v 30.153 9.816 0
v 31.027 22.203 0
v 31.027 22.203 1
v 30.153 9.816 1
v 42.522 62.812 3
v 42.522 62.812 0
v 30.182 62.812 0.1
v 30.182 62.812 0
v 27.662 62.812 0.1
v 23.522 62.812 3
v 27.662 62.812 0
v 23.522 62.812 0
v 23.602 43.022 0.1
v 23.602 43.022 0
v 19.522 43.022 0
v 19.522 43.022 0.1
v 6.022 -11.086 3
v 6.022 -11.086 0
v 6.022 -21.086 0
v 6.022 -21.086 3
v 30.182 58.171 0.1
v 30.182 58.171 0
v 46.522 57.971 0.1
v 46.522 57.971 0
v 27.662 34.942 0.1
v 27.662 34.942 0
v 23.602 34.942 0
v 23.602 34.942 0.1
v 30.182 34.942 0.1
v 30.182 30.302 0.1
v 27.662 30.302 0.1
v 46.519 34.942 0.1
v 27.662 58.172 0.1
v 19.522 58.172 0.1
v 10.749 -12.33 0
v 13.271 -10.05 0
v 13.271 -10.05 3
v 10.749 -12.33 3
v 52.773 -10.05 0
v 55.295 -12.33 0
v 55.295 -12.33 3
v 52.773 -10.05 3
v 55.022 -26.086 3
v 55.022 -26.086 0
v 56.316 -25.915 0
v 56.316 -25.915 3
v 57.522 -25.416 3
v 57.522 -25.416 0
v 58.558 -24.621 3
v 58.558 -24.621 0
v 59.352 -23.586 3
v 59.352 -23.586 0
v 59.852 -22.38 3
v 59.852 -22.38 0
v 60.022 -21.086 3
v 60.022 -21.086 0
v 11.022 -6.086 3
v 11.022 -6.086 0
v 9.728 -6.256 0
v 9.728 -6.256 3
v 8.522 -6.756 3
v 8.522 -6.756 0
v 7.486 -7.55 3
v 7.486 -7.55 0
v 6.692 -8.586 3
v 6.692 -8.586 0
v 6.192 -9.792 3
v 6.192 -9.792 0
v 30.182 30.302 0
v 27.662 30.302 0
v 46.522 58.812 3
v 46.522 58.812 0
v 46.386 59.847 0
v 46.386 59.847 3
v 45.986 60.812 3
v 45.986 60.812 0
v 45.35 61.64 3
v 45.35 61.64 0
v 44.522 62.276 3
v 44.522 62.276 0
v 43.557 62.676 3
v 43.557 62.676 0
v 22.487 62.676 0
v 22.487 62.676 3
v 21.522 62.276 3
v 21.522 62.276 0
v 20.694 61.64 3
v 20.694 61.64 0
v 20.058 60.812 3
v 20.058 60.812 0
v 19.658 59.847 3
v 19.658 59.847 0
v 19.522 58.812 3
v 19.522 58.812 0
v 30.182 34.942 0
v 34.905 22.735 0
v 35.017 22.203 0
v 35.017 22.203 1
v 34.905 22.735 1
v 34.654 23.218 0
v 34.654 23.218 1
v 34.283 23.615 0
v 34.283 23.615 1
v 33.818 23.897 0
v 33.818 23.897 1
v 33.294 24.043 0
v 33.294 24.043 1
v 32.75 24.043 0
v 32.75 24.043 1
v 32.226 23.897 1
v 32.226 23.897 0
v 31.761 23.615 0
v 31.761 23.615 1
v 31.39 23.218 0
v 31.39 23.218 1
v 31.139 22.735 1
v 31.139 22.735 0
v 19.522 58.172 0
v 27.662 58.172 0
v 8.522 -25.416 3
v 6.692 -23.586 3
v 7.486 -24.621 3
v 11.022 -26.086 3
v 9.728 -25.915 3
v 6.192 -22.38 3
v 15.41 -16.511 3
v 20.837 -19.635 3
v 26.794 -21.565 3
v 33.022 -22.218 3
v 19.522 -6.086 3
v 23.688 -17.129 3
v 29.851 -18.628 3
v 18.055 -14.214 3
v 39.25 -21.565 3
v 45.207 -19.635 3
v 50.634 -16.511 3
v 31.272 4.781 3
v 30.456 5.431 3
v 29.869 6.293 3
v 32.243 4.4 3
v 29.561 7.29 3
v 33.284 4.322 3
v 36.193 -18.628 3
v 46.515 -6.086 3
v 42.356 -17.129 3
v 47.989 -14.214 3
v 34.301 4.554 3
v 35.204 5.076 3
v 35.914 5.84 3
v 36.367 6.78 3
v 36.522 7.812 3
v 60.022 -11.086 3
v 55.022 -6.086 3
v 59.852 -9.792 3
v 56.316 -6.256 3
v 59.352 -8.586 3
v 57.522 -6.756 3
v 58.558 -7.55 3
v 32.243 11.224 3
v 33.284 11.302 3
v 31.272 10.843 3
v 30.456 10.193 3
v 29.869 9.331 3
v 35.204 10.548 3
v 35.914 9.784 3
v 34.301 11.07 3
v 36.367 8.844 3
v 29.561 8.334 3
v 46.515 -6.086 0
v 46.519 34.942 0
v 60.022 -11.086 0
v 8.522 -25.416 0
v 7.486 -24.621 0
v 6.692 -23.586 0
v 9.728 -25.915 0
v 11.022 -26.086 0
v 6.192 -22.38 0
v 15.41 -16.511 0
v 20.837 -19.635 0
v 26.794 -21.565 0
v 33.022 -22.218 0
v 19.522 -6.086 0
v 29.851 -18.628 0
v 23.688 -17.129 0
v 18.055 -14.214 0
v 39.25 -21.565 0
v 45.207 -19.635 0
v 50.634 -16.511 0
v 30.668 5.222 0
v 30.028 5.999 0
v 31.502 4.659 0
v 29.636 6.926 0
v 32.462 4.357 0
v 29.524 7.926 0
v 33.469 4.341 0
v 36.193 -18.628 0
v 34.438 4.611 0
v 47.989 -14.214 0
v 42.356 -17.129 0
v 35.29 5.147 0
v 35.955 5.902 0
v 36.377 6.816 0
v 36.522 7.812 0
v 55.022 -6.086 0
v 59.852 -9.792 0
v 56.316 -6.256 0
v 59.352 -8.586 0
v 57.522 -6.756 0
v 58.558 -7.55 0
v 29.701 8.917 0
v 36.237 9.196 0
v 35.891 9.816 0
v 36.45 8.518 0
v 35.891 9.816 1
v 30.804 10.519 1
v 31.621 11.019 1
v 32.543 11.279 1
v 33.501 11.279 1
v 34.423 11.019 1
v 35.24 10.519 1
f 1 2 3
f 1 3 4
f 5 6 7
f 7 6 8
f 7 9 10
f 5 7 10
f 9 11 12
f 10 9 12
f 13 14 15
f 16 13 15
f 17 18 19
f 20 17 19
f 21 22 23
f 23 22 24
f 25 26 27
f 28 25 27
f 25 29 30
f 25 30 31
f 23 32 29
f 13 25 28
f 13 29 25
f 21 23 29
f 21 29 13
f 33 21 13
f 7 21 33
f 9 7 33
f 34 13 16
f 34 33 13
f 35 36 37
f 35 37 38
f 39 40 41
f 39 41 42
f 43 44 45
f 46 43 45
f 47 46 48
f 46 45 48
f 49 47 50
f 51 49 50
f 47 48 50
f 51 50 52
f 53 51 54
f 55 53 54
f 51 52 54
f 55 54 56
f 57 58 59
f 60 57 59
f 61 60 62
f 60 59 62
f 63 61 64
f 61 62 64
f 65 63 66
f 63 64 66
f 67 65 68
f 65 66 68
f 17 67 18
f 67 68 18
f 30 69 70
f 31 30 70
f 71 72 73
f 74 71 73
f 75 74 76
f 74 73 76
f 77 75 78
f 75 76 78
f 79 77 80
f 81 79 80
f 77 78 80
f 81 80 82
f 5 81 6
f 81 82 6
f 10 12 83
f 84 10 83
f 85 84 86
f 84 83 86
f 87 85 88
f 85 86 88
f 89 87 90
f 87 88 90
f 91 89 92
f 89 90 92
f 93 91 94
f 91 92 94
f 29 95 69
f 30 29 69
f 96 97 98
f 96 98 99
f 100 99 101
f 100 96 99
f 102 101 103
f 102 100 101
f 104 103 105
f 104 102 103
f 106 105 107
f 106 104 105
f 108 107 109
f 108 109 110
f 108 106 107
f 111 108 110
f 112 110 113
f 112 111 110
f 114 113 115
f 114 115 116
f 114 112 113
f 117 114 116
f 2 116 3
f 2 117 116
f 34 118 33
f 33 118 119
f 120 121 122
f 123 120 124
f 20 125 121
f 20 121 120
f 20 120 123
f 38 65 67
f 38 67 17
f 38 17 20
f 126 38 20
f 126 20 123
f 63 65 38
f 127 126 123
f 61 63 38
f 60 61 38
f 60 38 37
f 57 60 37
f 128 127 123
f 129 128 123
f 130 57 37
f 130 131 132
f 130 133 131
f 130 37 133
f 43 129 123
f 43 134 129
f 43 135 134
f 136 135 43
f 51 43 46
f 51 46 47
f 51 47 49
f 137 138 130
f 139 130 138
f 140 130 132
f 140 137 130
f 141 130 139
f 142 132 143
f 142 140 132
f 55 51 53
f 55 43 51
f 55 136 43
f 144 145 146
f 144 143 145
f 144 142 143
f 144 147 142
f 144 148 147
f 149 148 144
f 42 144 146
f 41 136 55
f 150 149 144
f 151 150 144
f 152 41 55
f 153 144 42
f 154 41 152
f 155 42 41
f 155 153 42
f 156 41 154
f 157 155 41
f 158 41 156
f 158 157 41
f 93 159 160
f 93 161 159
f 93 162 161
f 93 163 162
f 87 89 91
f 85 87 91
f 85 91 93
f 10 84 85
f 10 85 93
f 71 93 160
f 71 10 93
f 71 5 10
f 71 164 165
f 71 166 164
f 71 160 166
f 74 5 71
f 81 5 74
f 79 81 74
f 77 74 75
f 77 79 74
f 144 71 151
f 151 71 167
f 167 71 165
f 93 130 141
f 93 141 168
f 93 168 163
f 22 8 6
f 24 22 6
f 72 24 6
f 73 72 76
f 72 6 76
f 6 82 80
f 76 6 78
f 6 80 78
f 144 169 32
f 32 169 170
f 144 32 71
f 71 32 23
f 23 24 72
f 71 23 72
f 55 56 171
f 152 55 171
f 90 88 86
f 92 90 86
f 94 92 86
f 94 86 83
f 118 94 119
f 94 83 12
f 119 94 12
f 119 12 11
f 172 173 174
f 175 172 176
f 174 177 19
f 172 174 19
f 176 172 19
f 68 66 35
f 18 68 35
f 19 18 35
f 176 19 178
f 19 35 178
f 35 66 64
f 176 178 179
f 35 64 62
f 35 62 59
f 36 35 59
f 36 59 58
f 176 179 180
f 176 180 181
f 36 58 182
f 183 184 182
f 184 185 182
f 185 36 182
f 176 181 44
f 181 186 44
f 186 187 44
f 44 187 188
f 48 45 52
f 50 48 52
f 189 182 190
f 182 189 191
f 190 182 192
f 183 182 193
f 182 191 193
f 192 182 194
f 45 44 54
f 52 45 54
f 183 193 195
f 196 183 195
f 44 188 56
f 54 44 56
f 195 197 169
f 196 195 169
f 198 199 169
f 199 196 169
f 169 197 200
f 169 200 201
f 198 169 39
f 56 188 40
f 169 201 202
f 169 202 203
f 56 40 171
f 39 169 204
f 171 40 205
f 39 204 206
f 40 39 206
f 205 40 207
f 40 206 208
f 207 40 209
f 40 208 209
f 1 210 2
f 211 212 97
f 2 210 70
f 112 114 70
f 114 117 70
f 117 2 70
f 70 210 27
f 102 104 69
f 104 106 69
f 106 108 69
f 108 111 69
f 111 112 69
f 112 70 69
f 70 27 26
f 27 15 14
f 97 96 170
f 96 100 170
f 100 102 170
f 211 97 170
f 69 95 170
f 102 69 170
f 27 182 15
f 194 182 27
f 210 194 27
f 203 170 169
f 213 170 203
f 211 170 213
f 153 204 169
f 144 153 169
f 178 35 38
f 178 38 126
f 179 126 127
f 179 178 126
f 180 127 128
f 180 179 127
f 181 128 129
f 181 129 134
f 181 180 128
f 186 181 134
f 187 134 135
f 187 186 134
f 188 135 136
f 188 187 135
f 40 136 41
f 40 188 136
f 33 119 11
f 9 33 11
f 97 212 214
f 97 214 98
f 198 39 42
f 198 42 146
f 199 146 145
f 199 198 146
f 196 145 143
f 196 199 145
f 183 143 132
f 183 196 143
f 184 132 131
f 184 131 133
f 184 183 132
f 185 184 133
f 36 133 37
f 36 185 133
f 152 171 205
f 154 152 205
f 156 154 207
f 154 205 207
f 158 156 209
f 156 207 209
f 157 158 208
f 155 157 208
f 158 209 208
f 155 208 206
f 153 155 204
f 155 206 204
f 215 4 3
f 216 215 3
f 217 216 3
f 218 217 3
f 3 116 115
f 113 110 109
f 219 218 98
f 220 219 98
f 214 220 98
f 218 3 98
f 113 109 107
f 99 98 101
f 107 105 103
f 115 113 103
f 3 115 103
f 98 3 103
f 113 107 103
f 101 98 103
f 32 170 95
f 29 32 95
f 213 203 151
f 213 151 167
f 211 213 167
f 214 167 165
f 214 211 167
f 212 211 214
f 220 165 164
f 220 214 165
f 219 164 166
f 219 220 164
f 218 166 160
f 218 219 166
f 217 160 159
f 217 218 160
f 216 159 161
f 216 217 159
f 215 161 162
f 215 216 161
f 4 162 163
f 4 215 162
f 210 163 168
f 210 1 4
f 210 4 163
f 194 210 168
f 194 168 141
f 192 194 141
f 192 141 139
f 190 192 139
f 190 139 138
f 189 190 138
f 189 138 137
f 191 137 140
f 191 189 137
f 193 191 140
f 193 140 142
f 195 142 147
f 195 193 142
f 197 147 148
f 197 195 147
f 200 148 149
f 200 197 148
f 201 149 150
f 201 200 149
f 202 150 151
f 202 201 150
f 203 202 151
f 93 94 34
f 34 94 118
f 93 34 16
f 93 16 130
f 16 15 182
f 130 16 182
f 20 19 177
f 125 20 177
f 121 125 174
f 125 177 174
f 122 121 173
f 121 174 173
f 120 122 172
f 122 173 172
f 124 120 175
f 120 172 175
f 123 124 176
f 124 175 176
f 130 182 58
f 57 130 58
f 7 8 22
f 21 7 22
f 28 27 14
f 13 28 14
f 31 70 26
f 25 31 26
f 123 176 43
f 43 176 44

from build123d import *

# Parameters (mm, degrees)
CORTE_EXTERIOR_R        = 3.500001168
SALIENTE_EXTRUIR1_DEPTH = 3
CORTAR_EXTRUIR1_DEPTH   = 1
CORTAR_EXTRUIR2_DEPTH   = 0.1


with BuildPart() as part:
    # Corte exterior → Saliente-Extruir1 (new body)
    with BuildSketch(Plane.XY):
        with BuildLine():
            Line((19.521996462, -6.085833738), (11.021996462, -6.085833738))
            ThreePointArc((11.021996462, -6.085833738), (7.486462556, -7.550299832), (6.021996462, -11.085833738))
            Line((6.021996462, -11.085833738), (6.021996462, -21.085833738))
            ThreePointArc((6.021996462, -21.085833738), (7.486462556, -24.621367644), (11.021996462, -26.085833738))
            Line((11.021996462, -26.085833738), (55.021996462, -26.085833738))
            ThreePointArc((55.021996462, -26.085833738), (58.557530368, -24.621367644), (60.021996462, -21.085833738))
            Line((60.021996462, -21.085833738), (60.021996462, -11.085833738))
            ThreePointArc((60.021996462, -11.085833738), (58.557530368, -7.550299832), (55.021996462, -6.085833738))
            Line((55.021996462, -6.085833738), (46.514841363, -6.085833738))
            Line((46.514841363, -6.085833738), (46.521996462, 58.812041738))
            ThreePointArc((46.521996462, 58.812041738), (45.350423587, 61.640468863), (42.521996462, 62.812041738))
            Line((42.521996462, 62.812041738), (23.521996462, 62.812041738))
            ThreePointArc((23.521996462, 62.812041738), (20.693569337, 61.640468863), (19.521996462, 58.812041738))
            Line((19.521996462, 58.812041738), (19.521996462, -6.085833738))
        make_face()
        with Locations((33.021996462, 7.812041474)):
            Circle(CORTE_EXTERIOR_R, mode=Mode.SUBTRACT)
        with BuildLine():
            Line((55.29494797, -12.330366391), (52.77320204, -10.049840692))
            ThreePointArc((52.77320204, -10.049840692), (33.021996462, -18.817961696), (13.270789317, -10.049842109))
            Line((13.270789317, -10.049842109), (10.749043386, -12.330367808))
            ThreePointArc((10.749043386, -12.330367808), (33.021996462, -22.217961696), (55.29494797, -12.330366391))
        make_face(mode=Mode.SUBTRACT)
    extrude(amount=SALIENTE_EXTRUIR1_DEPTH)

    # Grabado Superficie → Cortar-Extruir1 (cut)
    with BuildSketch(Plane.XY):
        with BuildLine():
            Line((35.89134848, 9.816243852), (35.017032688, 22.202862127))
            ThreePointArc((35.017032688, 22.202862127), (33.021996462, 24.062041474), (31.026960236, 22.202862127))
            Line((31.026960236, 22.202862127), (30.152644444, 9.816243852))
            ThreePointArc((30.152644444, 9.816243852), (33.021996462, 11.312042642), (35.89134848, 9.816243852))
        make_face()
    extrude(amount=CORTAR_EXTRUIR1_DEPTH, mode=Mode.SUBTRACT)

    # grabado linea medio → Cortar-Extruir2 (cut)
    with BuildSketch(Plane.XY):
        Polygon((23.601996462, 43.022041738), (19.521996462, 43.022041738), (19.521996462, 58.172041738), (27.661996462, 58.172041738), (27.661996462, 62.812041738), (30.181996462, 62.812041738), (30.181996462, 58.170825238), (46.521996462, 57.970825238), (46.521996462, 34.942041738), (30.181996462, 34.942041738), (30.181996462, 30.302041738), (27.661996462, 30.302041738), (27.661996462, 34.942041738), (23.601996462, 34.942041738), align=None)
    extrude(amount=CORTAR_EXTRUIR2_DEPTH, mode=Mode.SUBTRACT)


solid = part.part
